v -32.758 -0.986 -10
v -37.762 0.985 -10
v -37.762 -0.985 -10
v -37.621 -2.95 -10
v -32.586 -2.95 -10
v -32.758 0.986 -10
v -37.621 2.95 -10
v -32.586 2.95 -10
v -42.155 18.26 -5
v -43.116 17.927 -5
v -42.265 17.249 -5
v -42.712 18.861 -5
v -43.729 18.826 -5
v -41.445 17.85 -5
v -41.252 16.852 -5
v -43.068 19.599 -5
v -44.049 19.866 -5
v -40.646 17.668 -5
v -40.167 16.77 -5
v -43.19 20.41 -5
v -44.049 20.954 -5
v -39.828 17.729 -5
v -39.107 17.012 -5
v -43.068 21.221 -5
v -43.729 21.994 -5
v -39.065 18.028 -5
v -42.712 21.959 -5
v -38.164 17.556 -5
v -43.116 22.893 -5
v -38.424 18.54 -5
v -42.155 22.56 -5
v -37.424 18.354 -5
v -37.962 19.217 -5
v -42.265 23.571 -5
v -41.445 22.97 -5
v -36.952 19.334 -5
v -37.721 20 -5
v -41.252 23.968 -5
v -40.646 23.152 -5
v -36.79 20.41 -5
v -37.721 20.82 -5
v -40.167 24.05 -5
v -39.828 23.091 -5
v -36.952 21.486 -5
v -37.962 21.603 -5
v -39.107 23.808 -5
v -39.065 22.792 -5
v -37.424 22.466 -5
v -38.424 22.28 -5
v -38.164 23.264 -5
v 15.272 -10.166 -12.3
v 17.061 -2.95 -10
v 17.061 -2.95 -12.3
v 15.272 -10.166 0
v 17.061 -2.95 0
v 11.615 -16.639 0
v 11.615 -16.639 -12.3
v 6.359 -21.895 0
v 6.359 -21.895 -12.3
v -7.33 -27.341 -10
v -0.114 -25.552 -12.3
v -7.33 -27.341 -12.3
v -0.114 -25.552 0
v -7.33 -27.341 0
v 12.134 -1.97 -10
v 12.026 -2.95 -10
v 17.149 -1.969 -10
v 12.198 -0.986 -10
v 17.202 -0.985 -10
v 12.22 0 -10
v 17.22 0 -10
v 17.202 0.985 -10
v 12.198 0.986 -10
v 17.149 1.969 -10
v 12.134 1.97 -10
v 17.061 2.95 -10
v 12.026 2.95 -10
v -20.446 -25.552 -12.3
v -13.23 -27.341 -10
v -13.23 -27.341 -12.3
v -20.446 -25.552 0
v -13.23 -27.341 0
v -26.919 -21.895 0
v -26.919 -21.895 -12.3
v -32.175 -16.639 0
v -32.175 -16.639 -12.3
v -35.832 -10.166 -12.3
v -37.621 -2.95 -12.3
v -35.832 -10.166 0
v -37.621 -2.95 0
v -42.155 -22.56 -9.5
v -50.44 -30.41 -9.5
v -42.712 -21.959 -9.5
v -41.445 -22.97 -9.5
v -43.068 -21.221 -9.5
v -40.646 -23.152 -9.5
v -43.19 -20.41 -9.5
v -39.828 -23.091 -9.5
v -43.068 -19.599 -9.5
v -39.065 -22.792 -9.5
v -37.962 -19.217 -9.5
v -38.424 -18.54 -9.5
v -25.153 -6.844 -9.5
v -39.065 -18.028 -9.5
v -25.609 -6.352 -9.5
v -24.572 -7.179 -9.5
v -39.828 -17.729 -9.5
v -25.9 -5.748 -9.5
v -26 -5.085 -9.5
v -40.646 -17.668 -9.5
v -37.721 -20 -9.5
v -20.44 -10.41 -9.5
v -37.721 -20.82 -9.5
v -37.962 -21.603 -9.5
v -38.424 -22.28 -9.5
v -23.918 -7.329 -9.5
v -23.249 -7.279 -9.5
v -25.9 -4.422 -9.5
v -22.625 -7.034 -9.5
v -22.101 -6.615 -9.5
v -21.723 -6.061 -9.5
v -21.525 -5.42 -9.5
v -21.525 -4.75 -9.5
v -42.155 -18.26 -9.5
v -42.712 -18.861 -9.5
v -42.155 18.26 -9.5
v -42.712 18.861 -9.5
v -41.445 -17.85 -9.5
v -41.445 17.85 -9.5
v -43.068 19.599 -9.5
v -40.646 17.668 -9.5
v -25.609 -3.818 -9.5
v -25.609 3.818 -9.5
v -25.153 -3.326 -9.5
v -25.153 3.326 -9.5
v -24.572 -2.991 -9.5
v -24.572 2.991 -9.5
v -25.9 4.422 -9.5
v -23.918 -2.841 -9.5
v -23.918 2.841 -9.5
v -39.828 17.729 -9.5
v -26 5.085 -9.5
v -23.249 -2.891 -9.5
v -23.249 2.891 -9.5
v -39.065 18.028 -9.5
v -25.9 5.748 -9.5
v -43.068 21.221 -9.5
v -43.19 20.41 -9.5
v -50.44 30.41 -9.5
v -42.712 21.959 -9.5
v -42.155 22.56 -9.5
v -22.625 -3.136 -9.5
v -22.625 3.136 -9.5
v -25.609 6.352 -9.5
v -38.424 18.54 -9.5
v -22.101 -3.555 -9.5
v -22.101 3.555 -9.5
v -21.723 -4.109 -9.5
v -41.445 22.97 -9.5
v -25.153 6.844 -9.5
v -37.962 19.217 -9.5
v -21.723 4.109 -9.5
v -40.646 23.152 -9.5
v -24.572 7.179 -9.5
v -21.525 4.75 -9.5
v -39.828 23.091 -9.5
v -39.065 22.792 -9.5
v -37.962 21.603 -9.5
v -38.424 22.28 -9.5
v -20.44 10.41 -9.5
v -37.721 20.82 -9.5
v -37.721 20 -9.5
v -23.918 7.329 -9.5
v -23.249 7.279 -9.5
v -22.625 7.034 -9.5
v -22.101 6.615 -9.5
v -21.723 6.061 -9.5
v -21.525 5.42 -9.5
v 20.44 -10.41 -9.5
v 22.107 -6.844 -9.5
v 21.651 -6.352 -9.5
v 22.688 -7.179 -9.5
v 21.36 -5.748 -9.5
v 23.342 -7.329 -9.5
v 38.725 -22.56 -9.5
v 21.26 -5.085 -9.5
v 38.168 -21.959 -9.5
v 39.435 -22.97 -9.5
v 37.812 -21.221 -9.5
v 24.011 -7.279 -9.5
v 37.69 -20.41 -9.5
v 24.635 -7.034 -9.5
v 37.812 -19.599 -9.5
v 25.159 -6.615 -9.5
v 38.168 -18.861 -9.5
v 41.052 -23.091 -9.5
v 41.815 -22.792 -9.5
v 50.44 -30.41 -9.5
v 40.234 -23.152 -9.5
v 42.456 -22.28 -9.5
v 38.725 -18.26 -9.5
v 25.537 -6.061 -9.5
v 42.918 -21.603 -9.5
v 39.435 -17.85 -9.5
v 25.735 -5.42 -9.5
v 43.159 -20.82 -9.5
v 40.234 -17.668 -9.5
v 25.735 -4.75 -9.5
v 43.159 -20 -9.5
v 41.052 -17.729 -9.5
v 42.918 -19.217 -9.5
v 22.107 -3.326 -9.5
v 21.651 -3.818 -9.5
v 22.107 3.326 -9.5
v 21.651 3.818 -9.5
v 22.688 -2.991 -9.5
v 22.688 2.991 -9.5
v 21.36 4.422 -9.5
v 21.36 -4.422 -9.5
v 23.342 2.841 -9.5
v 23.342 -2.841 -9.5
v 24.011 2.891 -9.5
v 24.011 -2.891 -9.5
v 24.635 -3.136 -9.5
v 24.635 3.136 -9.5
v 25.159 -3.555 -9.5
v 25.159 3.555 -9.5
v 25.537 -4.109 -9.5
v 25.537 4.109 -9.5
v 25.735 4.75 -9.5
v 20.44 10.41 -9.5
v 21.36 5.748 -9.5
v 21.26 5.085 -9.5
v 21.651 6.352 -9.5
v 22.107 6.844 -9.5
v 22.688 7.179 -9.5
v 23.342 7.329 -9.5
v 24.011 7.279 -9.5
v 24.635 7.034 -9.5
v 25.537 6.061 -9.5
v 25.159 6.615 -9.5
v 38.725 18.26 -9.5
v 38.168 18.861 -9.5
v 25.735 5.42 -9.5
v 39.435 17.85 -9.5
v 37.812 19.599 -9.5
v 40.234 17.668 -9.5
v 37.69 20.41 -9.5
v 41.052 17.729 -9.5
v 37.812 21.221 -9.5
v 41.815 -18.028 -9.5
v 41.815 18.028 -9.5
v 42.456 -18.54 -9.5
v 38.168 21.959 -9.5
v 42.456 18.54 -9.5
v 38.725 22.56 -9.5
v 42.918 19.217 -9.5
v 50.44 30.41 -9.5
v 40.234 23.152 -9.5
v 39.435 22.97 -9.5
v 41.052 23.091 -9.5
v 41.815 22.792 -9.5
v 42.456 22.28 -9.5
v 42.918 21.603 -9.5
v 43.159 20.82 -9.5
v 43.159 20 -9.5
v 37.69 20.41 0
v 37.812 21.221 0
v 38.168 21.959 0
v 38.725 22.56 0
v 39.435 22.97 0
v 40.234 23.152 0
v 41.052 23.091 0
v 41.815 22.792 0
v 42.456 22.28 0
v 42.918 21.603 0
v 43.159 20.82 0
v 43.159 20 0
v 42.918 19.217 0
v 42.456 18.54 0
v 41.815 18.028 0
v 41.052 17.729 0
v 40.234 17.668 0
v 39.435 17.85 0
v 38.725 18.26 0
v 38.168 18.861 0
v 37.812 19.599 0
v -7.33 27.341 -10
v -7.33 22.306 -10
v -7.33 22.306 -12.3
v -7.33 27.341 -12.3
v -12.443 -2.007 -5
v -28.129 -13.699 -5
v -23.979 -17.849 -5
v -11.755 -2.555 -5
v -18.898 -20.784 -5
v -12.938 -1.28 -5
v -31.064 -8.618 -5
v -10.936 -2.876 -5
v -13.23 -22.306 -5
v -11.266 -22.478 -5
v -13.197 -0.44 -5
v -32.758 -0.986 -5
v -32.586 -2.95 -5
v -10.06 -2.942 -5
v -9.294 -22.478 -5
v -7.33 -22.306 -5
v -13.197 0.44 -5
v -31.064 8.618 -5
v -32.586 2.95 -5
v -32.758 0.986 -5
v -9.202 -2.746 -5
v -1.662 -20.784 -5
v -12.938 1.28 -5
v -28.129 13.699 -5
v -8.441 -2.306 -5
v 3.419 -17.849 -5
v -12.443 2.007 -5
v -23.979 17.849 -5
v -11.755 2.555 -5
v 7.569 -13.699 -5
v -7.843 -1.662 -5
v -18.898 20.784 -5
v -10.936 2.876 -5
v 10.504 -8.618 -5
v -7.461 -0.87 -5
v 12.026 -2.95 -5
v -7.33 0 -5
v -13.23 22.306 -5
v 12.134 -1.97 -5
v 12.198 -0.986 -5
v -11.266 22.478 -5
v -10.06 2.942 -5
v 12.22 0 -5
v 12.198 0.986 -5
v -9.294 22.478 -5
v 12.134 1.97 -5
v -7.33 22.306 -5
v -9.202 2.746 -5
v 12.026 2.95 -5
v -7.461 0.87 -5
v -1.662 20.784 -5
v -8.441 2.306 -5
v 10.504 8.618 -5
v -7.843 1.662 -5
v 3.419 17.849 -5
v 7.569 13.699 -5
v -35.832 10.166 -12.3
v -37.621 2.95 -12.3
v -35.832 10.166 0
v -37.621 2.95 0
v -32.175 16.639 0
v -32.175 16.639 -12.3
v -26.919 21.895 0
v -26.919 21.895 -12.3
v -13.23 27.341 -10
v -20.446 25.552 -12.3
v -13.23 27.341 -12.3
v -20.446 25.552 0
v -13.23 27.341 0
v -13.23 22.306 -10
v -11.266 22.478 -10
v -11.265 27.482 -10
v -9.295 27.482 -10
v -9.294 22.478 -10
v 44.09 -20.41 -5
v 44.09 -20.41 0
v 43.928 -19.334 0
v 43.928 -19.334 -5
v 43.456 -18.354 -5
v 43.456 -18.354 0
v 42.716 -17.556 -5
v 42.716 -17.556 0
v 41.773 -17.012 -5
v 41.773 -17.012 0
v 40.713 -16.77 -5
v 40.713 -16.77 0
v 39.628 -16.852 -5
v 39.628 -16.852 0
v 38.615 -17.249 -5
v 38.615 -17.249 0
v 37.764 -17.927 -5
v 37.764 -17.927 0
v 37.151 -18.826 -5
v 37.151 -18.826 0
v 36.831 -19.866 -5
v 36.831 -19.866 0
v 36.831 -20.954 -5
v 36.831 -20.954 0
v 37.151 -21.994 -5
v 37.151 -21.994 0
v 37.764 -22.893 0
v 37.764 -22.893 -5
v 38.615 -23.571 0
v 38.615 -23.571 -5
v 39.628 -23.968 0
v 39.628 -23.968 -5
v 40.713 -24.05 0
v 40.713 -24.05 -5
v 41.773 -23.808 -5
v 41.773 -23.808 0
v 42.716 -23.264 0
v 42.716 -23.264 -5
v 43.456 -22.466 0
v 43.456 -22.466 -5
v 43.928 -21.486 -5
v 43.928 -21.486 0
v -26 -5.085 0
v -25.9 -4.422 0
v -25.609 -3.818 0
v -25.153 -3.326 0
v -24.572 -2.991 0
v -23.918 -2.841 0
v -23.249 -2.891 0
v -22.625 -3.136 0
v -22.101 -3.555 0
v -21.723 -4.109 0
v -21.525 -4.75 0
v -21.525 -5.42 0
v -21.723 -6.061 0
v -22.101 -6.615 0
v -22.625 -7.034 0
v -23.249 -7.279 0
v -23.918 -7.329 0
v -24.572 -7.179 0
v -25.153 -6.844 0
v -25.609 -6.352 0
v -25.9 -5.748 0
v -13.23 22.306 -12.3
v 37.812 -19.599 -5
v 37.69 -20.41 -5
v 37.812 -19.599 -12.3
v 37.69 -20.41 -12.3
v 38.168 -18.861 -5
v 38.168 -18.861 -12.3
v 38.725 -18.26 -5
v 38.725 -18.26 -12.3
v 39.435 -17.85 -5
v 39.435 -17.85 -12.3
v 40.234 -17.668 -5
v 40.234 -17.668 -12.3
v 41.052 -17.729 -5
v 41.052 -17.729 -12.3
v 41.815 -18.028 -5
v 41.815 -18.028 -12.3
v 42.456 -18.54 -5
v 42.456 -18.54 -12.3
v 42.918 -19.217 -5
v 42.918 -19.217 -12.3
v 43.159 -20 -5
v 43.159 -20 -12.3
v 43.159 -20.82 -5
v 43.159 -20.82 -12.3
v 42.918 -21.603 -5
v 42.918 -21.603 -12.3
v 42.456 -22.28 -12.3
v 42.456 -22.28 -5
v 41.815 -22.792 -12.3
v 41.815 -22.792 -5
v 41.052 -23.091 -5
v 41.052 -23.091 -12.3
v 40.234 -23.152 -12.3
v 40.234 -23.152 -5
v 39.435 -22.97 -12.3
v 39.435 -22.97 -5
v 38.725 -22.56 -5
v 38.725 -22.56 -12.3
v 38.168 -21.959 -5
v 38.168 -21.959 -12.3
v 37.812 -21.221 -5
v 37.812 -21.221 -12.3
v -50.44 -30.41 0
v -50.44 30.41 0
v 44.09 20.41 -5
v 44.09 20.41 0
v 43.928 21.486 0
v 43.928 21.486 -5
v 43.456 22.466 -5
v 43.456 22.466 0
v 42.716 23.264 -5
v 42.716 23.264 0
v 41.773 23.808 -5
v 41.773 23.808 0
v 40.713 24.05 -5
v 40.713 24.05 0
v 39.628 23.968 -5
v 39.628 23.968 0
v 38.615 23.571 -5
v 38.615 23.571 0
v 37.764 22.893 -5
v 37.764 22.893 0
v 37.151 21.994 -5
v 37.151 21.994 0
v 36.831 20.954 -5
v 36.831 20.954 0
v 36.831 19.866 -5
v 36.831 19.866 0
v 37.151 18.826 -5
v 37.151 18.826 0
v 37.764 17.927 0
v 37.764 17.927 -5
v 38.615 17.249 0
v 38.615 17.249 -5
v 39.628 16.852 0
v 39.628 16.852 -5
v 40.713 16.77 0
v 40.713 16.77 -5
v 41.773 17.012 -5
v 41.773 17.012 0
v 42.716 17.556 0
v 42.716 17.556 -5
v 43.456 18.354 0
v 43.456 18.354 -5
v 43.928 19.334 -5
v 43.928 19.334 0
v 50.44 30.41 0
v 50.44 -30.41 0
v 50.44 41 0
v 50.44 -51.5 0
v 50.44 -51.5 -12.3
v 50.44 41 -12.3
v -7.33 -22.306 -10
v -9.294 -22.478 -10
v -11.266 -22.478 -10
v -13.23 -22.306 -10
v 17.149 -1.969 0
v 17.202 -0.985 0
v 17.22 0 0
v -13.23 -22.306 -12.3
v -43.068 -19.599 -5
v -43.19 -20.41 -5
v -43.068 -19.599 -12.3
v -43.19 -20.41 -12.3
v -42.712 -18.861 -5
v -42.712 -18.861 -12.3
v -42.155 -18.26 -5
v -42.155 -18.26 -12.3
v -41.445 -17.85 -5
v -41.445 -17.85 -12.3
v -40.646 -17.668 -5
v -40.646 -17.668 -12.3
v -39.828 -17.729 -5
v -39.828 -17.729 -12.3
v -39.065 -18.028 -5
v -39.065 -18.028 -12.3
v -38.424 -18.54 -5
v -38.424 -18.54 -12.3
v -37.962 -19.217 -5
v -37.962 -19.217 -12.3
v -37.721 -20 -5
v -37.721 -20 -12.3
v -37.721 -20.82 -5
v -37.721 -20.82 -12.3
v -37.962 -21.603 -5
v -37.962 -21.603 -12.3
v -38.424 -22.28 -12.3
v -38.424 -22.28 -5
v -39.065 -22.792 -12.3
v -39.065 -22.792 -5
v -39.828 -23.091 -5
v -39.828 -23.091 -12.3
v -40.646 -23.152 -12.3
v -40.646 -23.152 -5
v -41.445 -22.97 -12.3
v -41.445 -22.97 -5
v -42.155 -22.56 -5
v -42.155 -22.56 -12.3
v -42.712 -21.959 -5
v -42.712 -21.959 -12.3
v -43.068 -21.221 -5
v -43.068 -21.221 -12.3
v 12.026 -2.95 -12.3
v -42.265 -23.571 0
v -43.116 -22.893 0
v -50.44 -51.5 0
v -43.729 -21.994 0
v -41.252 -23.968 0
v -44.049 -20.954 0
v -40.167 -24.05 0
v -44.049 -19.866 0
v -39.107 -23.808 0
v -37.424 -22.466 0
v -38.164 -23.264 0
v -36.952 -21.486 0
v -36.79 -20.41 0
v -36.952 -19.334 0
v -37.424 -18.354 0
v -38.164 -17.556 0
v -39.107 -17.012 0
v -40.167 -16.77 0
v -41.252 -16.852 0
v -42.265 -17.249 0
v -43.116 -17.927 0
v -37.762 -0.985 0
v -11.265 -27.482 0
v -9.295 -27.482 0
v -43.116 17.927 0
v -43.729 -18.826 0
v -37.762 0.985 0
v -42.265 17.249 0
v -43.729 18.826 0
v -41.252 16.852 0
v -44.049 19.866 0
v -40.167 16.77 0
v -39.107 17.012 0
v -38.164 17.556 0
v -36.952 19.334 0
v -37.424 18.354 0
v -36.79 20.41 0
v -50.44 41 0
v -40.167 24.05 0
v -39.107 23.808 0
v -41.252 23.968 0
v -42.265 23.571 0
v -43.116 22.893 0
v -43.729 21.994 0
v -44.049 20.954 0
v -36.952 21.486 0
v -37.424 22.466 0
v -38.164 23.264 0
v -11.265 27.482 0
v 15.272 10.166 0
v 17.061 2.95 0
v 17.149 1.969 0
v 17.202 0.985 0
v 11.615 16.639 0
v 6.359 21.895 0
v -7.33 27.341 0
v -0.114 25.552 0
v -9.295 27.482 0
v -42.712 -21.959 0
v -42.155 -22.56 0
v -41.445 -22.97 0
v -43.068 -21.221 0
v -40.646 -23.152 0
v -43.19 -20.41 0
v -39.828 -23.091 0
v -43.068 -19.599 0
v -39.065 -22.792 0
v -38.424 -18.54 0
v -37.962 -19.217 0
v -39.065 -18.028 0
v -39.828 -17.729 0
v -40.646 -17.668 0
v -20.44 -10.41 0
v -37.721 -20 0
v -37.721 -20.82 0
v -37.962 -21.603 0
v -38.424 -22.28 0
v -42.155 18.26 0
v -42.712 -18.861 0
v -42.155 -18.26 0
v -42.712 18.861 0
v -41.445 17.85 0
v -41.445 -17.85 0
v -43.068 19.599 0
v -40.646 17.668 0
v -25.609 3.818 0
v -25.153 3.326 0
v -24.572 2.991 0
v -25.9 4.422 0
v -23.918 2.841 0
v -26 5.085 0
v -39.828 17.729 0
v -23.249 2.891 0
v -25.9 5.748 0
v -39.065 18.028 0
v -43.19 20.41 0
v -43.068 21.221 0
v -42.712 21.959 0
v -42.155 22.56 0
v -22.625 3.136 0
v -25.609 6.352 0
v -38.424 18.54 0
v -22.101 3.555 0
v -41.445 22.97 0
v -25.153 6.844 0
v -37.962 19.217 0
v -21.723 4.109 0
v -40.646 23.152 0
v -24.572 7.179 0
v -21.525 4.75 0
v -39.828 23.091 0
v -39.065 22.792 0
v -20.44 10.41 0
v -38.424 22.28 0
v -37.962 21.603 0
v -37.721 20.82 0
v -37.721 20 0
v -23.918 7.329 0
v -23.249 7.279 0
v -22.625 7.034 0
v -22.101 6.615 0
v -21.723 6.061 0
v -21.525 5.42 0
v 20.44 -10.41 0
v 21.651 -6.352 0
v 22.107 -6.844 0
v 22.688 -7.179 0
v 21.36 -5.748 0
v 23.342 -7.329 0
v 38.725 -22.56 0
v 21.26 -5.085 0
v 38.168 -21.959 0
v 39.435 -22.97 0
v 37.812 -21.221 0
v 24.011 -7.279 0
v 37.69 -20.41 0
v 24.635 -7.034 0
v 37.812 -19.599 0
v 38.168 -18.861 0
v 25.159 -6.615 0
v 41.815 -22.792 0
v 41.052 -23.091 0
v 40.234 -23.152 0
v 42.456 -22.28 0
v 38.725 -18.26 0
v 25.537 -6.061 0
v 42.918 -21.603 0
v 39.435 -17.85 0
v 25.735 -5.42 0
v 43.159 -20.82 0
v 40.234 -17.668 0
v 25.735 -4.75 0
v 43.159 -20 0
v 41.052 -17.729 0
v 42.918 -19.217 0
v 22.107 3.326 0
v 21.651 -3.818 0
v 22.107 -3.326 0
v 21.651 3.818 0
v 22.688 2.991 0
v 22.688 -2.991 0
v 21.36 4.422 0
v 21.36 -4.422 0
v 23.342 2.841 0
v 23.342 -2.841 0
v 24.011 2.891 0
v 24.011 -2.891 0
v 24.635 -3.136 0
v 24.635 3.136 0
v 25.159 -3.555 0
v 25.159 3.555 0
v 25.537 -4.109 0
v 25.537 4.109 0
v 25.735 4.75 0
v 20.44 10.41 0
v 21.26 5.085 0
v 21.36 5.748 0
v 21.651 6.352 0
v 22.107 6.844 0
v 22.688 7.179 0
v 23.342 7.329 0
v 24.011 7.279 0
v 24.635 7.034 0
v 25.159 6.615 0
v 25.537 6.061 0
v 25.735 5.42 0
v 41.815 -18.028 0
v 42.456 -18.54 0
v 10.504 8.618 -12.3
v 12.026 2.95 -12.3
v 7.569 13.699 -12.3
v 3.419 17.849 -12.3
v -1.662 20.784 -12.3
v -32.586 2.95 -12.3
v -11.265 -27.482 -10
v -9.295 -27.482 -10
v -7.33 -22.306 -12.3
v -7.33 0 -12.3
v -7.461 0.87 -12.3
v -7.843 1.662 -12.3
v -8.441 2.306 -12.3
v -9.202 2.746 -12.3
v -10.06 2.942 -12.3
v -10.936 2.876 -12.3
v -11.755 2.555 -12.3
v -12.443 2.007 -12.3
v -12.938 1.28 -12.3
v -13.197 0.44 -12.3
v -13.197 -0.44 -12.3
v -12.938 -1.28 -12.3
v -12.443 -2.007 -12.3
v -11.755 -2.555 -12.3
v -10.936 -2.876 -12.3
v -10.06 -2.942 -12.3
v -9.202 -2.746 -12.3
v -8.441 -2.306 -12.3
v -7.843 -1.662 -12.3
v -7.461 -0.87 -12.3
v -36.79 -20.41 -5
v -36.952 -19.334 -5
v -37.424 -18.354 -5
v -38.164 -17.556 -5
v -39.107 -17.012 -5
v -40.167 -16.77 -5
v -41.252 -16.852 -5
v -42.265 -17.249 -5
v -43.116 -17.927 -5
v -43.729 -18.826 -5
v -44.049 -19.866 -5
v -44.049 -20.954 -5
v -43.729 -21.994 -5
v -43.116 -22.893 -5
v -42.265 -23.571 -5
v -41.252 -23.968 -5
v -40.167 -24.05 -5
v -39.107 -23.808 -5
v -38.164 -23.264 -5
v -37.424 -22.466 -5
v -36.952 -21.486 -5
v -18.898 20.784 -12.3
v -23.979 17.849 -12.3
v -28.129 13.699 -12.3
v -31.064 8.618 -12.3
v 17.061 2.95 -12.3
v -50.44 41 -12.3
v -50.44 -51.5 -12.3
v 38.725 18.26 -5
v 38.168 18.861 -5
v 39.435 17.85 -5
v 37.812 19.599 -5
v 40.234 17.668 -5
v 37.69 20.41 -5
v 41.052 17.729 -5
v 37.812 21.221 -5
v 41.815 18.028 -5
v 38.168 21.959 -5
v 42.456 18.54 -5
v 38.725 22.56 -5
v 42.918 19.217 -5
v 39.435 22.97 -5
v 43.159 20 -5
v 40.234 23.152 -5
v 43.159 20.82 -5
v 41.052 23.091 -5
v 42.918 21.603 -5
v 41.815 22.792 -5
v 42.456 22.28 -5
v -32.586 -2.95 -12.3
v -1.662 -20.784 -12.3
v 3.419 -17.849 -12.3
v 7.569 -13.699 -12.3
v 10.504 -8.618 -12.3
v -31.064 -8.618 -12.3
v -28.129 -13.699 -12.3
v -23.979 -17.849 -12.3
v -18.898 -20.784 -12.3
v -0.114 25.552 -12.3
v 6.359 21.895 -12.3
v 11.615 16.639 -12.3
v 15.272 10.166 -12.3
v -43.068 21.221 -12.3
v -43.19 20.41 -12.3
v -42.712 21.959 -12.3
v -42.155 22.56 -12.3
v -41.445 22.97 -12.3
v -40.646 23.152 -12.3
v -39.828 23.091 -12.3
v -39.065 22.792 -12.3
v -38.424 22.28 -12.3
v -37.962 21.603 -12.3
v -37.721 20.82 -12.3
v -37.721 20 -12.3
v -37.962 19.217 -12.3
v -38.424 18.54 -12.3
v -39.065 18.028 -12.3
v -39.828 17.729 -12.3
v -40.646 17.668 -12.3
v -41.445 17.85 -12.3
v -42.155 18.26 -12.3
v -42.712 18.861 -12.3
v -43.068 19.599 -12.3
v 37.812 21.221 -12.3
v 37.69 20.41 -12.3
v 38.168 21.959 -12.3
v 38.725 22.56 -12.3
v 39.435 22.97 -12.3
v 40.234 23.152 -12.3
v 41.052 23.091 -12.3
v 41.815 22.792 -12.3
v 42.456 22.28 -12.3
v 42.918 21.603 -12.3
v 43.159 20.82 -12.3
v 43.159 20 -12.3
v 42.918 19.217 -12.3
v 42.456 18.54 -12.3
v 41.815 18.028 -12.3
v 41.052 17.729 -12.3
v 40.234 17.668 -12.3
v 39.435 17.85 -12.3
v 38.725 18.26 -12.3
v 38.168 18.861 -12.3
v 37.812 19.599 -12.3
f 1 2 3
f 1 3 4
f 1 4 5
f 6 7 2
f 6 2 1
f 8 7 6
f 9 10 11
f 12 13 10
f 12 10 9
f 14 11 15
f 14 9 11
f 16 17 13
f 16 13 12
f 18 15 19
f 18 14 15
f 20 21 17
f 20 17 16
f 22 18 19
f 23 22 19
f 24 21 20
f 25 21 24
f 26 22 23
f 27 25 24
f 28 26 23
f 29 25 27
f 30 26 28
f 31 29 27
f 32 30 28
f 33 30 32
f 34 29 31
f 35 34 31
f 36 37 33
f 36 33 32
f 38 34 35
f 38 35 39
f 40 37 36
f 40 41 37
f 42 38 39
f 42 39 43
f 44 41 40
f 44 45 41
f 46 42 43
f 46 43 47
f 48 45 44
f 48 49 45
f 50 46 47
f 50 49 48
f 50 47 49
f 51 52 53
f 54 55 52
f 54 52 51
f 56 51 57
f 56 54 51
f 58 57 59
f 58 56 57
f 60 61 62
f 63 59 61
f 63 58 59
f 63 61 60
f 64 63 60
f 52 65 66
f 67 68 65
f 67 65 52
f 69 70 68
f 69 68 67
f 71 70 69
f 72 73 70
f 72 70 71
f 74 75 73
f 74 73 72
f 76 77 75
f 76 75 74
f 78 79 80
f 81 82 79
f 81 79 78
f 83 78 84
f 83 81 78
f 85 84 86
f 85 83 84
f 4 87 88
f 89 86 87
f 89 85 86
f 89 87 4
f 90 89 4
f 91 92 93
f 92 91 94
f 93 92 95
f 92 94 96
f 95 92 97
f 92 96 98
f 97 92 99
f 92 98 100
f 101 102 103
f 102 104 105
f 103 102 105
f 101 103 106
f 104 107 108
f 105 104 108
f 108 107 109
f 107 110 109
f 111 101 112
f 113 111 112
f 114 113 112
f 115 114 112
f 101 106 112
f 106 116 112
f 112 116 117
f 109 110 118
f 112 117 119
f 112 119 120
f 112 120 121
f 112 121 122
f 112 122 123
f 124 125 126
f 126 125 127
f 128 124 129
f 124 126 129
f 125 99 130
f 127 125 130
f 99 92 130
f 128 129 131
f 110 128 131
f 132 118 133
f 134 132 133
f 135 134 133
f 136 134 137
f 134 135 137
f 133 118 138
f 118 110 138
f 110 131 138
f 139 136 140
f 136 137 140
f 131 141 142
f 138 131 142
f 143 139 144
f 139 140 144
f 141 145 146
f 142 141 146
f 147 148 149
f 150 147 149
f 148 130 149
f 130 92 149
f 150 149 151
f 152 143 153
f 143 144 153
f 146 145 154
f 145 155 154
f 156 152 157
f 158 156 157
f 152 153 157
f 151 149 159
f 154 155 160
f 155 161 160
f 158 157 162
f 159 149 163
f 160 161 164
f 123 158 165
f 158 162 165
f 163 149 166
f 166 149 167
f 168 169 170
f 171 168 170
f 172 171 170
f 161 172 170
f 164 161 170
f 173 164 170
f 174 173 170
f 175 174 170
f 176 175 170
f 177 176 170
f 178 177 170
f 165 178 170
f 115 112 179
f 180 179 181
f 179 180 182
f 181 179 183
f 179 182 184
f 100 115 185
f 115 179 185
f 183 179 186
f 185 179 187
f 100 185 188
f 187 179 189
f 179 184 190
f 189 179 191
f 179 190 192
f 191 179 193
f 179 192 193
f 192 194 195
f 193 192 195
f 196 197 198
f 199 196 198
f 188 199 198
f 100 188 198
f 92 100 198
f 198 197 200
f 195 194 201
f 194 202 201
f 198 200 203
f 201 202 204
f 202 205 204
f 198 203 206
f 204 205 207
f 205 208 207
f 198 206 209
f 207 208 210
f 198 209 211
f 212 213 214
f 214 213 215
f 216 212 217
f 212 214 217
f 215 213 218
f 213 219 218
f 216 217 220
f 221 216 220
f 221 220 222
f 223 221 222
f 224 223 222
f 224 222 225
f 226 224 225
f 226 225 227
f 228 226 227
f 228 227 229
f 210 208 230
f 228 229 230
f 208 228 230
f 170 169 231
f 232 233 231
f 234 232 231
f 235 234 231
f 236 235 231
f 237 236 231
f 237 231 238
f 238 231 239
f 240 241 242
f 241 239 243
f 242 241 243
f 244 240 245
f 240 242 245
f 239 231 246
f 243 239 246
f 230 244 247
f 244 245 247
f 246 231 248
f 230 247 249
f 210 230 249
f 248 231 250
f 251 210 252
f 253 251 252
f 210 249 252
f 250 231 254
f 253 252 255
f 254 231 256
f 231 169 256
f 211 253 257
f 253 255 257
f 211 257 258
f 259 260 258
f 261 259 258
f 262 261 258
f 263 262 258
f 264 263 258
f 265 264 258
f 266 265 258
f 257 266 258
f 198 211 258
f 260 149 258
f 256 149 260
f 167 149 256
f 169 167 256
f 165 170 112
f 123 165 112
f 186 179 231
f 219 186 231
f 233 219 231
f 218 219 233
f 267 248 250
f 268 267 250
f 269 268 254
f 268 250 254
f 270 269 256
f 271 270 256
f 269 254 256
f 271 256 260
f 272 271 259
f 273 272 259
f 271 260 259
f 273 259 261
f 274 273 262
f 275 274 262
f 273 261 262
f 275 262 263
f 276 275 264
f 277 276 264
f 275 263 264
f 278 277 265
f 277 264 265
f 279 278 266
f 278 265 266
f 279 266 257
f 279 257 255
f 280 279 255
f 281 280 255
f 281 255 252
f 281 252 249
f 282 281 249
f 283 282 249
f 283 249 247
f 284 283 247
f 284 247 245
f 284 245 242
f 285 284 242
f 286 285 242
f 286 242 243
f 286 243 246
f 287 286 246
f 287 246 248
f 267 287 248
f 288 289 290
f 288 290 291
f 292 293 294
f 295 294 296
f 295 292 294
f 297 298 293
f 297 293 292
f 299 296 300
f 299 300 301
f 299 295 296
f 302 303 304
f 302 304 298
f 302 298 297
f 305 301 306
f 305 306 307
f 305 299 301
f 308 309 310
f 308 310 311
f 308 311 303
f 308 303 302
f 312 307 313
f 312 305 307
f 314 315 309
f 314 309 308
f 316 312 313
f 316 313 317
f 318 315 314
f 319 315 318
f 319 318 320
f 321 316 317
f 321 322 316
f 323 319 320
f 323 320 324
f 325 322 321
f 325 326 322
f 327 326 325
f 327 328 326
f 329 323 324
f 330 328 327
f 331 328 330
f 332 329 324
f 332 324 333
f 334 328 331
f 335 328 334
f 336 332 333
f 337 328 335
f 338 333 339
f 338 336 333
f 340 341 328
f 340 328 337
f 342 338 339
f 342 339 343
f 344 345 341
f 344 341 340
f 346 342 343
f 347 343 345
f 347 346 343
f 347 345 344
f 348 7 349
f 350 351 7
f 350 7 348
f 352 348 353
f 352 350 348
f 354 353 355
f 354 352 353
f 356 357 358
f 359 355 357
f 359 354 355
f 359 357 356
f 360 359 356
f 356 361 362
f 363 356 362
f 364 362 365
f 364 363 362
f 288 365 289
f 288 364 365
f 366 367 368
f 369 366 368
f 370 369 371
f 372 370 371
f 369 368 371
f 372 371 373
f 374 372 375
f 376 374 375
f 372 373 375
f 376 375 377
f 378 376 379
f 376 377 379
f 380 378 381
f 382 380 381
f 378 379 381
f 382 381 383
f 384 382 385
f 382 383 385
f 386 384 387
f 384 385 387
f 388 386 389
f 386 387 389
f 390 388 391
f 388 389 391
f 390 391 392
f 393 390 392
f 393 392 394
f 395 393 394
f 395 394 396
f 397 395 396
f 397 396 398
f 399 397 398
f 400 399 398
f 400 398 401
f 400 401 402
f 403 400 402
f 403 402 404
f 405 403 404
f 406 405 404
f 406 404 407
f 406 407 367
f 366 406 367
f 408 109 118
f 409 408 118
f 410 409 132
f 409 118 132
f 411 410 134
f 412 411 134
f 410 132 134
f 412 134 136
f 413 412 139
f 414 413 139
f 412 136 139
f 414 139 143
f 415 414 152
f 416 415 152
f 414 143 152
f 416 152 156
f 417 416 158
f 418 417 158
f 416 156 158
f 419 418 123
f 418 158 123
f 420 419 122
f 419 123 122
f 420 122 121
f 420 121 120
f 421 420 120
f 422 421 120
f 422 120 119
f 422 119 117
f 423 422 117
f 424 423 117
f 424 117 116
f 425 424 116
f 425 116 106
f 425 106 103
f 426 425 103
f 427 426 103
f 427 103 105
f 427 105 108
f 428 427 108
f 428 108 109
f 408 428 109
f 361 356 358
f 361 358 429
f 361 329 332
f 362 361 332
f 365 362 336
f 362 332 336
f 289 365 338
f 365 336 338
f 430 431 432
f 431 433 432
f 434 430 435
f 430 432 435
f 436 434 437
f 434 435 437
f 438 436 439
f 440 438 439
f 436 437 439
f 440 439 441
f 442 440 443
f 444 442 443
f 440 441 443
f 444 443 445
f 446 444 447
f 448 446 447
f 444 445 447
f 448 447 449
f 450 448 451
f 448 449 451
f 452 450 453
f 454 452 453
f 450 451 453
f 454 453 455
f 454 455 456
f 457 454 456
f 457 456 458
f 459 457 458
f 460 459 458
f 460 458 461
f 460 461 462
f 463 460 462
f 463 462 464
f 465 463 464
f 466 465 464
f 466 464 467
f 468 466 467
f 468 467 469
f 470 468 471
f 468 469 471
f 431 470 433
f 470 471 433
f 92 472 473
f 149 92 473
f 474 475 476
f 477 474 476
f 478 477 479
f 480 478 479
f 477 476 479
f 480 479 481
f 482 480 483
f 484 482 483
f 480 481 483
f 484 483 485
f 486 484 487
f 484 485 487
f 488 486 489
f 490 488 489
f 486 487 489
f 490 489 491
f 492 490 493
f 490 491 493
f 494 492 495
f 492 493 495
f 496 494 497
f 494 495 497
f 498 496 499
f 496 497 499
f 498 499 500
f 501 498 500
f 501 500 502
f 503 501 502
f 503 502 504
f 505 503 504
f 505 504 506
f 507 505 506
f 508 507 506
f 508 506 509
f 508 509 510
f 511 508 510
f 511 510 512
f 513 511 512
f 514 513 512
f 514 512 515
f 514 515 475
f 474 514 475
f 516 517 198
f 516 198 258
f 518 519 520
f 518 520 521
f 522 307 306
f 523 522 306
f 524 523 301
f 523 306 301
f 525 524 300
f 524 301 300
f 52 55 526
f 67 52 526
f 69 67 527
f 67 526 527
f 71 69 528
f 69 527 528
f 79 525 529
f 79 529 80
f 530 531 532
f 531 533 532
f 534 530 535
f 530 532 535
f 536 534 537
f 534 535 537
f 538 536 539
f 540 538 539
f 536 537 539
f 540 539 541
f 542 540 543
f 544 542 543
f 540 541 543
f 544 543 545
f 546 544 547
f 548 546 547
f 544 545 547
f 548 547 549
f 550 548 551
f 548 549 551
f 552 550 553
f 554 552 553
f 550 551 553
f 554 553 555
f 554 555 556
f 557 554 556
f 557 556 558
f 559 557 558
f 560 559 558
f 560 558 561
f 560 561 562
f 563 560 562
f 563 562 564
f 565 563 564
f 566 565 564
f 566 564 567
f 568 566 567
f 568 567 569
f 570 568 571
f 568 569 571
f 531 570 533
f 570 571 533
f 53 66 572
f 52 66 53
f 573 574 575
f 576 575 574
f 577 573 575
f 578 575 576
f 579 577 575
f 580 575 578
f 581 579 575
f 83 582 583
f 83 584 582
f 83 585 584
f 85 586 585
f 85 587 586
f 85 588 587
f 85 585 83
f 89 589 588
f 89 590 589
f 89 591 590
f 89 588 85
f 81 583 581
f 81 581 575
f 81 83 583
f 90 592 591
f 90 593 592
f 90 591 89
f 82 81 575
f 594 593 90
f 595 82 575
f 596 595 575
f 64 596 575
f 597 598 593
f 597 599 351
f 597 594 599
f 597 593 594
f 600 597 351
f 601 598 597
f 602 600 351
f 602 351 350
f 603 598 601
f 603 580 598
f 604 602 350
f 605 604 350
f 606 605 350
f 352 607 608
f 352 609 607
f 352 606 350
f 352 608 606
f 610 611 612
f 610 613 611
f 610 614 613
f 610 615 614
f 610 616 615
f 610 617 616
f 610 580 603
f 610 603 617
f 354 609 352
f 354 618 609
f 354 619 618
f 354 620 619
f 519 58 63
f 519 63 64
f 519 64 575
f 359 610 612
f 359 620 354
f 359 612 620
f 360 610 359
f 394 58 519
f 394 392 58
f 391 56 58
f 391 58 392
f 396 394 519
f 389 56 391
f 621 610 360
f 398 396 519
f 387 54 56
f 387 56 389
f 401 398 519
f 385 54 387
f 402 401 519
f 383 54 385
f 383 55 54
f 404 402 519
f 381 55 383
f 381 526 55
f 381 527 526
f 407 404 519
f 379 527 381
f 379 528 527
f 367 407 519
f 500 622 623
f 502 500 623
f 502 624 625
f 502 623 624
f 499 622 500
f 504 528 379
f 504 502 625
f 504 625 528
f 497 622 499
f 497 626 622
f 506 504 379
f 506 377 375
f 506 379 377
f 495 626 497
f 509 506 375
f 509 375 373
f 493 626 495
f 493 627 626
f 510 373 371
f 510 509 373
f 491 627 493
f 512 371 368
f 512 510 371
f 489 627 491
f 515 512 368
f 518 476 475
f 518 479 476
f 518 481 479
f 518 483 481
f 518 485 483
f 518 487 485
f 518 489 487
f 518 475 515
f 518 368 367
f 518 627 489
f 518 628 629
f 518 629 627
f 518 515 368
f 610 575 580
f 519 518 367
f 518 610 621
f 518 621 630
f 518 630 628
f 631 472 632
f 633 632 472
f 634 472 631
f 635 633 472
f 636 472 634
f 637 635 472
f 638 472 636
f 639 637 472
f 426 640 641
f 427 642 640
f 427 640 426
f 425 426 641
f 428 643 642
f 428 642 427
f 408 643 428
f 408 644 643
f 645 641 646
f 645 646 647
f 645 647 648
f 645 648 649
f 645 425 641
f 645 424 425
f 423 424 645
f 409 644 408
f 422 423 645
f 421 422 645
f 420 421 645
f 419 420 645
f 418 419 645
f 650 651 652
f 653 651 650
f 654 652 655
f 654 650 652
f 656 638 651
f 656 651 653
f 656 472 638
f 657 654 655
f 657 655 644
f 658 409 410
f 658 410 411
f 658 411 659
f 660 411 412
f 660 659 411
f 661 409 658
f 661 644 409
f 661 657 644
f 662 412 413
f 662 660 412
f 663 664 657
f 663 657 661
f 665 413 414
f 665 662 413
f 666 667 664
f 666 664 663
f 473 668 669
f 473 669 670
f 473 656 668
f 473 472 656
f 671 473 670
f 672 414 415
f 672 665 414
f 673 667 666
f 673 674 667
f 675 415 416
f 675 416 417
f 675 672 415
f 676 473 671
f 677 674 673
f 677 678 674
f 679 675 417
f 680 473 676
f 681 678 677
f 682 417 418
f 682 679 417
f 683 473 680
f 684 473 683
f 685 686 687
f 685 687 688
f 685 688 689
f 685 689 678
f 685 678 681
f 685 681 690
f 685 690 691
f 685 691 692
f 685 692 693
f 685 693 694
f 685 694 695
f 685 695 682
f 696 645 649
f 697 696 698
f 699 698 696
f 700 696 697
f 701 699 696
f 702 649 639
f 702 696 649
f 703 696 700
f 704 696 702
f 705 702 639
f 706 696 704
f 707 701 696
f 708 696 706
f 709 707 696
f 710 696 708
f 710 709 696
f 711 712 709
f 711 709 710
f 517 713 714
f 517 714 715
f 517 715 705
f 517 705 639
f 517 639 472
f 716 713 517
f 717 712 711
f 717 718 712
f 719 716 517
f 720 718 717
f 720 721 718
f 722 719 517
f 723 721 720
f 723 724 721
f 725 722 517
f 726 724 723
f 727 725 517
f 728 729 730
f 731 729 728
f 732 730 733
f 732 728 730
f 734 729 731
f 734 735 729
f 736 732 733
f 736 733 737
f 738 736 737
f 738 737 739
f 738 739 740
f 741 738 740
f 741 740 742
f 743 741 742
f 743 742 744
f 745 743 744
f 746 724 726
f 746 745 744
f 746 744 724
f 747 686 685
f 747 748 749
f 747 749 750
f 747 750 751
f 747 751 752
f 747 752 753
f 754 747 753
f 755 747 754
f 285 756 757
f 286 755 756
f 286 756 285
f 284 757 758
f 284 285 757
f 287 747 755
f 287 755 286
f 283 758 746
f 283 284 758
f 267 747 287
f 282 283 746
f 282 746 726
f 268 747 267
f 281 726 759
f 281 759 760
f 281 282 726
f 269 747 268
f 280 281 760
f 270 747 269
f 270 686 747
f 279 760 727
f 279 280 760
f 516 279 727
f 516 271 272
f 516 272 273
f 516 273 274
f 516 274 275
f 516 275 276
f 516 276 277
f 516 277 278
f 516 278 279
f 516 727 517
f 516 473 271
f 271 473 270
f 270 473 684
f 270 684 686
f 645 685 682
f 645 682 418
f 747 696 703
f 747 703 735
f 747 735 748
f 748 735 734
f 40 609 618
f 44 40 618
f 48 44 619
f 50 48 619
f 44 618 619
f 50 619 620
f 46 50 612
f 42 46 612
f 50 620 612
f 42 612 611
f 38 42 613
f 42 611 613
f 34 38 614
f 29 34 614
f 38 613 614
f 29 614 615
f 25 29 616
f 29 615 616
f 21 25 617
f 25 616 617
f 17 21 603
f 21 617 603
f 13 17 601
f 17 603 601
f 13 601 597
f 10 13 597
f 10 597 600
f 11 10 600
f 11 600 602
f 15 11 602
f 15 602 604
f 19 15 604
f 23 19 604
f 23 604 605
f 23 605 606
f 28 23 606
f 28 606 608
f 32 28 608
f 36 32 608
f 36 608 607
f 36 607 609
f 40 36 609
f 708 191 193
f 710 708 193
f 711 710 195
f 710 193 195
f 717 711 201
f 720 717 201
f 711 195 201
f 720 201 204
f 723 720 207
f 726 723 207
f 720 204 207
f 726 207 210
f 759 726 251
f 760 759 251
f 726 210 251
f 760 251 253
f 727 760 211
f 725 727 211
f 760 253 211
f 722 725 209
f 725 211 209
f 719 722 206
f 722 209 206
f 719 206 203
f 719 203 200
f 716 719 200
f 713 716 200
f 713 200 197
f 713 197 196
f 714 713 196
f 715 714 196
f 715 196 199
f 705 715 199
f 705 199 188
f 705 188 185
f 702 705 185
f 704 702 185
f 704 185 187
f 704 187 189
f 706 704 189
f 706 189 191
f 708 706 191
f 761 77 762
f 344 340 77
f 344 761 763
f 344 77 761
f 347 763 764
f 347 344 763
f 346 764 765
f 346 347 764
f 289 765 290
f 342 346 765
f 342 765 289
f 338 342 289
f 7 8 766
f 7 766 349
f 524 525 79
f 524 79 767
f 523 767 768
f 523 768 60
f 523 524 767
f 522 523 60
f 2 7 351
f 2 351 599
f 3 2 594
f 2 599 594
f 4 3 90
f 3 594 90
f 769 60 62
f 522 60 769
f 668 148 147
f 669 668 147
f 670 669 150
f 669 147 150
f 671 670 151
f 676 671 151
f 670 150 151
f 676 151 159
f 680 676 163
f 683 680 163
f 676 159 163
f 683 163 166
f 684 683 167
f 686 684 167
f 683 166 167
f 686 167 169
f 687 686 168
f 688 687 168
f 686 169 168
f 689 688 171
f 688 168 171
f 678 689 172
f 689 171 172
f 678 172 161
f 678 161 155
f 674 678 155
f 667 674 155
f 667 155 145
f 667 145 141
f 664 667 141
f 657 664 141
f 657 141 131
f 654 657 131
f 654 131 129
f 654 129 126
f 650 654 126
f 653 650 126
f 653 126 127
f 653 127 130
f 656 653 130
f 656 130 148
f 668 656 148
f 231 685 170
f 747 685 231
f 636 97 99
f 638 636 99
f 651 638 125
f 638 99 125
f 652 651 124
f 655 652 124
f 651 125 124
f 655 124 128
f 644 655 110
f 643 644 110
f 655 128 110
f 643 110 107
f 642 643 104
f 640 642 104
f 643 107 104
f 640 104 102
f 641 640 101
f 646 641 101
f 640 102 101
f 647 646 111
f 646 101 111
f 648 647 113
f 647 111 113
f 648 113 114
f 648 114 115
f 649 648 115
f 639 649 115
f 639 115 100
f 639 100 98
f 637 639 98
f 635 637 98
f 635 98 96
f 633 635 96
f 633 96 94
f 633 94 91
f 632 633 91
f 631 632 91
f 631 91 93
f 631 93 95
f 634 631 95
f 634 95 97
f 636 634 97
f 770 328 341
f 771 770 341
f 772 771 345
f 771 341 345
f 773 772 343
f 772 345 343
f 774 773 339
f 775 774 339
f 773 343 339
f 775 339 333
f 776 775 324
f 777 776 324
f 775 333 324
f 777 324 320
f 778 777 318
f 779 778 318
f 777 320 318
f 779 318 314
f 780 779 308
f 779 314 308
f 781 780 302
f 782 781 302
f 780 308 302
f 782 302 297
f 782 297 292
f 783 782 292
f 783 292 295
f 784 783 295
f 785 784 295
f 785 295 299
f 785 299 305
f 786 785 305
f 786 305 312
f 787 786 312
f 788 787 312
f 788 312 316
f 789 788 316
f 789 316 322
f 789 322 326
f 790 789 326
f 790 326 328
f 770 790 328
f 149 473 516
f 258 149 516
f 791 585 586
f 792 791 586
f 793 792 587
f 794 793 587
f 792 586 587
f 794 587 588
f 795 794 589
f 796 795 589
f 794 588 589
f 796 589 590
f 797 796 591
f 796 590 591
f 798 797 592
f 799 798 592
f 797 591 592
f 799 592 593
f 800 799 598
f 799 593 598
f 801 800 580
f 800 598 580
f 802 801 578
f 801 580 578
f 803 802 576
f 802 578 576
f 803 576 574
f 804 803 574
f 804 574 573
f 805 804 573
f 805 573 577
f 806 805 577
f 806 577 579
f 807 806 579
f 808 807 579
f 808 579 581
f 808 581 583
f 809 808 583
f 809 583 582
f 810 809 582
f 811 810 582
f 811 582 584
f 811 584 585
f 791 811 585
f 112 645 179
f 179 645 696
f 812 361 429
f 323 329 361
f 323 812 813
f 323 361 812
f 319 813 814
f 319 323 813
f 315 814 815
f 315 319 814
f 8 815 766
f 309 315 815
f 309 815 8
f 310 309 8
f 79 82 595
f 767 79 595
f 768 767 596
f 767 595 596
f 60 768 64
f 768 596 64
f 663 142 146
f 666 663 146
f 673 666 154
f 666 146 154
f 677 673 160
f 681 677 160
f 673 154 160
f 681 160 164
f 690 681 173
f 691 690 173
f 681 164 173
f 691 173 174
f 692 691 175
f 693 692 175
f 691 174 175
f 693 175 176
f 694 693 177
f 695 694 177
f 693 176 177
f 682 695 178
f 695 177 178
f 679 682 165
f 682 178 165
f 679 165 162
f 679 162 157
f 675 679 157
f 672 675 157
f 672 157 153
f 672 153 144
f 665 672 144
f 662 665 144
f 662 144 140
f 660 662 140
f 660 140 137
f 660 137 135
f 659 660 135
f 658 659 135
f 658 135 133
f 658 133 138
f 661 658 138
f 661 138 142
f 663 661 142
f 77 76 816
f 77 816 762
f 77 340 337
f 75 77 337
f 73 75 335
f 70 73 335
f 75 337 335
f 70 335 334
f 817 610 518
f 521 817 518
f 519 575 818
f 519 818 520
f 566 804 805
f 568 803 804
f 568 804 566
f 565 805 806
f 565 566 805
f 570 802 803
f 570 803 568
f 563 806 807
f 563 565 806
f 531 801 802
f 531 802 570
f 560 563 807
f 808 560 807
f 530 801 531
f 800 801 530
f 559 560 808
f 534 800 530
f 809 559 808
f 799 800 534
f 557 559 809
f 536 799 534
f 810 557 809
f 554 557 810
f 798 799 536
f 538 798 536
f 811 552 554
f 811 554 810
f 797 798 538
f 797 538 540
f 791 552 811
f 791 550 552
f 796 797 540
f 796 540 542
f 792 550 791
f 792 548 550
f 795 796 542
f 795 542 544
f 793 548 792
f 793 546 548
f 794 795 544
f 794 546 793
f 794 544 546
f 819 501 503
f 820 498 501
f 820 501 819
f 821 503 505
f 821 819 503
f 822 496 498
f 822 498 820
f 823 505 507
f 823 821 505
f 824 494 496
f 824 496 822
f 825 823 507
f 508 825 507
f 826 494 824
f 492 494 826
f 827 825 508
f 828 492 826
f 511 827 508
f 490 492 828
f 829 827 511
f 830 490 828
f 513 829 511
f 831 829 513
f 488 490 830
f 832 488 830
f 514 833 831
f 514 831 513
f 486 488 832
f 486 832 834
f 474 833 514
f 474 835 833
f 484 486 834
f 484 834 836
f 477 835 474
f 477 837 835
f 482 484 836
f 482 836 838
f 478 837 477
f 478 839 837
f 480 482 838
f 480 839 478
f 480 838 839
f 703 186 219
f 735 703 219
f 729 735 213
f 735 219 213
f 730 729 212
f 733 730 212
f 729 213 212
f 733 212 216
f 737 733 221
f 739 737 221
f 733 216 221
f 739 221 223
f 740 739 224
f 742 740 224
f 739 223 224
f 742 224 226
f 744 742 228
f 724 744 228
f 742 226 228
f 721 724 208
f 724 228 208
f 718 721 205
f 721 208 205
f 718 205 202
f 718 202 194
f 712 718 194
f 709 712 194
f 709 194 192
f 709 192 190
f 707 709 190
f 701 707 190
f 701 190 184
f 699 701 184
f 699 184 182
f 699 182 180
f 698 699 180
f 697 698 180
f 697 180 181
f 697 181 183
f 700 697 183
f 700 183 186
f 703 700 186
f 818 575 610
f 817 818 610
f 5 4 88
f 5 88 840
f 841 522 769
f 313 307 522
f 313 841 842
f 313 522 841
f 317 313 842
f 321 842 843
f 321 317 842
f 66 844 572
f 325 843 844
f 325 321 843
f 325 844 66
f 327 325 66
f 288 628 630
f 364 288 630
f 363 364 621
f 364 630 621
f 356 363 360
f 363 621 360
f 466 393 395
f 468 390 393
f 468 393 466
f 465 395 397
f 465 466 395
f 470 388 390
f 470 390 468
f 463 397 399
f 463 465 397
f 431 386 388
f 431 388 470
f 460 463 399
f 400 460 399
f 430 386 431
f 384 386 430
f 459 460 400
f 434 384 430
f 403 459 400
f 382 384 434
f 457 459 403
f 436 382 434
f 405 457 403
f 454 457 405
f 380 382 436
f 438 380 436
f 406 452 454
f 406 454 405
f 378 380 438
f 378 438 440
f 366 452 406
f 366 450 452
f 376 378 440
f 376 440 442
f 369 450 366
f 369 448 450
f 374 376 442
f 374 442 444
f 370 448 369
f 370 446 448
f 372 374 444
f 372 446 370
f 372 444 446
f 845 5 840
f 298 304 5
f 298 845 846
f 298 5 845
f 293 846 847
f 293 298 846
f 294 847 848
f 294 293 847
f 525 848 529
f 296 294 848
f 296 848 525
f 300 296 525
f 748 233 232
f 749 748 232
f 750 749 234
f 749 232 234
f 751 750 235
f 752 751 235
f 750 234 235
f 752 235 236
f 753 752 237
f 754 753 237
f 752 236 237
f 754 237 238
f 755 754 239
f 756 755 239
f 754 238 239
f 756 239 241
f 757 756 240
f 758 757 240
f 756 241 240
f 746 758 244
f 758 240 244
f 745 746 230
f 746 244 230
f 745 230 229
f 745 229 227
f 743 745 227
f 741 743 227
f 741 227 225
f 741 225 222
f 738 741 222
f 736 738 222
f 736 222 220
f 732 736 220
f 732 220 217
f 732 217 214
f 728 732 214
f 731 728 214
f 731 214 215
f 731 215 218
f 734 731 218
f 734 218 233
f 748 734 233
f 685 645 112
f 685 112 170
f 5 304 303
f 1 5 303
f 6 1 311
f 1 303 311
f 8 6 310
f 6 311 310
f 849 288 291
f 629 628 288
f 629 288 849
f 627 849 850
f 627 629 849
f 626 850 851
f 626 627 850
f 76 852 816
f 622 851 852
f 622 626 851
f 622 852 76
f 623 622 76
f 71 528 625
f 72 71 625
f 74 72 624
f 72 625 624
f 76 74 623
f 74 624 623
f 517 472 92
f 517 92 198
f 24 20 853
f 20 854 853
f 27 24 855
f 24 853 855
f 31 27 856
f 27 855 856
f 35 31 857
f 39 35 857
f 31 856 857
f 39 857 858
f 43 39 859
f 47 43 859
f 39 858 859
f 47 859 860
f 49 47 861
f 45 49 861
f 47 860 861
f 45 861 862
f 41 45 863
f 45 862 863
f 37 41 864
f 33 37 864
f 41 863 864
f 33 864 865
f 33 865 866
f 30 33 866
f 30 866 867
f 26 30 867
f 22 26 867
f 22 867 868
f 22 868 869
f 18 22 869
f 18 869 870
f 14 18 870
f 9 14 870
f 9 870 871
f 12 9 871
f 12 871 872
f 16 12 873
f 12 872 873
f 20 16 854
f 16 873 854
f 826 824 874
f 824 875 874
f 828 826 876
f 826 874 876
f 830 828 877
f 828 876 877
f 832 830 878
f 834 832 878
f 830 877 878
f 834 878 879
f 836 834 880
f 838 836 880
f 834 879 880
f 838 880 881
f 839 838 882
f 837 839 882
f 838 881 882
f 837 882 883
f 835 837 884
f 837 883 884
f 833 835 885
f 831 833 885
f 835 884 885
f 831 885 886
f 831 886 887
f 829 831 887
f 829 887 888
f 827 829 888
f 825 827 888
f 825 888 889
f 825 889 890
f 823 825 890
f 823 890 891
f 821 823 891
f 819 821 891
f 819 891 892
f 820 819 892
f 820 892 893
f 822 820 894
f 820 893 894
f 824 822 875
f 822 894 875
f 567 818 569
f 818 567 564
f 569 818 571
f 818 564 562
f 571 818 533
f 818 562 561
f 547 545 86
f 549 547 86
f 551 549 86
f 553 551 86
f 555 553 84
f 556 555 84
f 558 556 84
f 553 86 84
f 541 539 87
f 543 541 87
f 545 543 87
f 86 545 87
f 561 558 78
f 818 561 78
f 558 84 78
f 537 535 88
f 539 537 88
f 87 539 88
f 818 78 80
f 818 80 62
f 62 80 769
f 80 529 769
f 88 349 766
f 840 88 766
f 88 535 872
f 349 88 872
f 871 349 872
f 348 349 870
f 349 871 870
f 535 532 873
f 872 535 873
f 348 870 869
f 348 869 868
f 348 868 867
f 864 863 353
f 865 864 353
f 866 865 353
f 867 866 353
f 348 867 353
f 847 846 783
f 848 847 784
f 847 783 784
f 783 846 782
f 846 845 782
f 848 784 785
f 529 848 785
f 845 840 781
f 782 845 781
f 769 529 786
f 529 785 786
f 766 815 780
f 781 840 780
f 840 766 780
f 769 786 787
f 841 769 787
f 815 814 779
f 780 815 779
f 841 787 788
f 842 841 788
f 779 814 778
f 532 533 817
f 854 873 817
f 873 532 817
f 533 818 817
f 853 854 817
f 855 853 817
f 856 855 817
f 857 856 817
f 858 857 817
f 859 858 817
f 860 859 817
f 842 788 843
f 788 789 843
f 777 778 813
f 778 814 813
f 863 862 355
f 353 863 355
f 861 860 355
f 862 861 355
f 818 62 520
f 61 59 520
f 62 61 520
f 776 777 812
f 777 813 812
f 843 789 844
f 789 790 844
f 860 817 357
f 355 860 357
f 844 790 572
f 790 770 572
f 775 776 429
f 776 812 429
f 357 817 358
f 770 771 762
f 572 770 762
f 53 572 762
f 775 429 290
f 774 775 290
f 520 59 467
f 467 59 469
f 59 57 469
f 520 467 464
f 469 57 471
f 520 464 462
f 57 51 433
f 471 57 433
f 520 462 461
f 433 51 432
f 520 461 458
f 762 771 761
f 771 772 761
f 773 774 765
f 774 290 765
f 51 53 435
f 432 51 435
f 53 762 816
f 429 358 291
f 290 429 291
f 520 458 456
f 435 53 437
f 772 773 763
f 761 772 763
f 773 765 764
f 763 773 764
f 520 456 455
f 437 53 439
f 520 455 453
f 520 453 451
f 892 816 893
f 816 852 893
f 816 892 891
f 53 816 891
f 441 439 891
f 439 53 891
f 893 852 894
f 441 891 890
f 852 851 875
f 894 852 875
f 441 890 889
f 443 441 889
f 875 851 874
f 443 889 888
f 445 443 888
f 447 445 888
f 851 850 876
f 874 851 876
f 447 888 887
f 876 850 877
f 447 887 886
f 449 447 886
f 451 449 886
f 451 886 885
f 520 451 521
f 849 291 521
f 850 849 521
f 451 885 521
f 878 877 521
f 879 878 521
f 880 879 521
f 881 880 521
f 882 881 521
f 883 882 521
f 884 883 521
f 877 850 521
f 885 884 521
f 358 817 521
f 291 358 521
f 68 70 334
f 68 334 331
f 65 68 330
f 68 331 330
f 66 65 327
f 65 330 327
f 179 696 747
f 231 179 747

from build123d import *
from build123d import SkipClean  # not in build123d's __all__

# Parameters (mm, degrees)
F1_W           = 100.88
F1_H           = 60.82
F1_W_2         = 40.88
F1_H_2         = 20.82
F2_DEPTH       = 9.5
F3_D           = 4.5
F4_D           = 5.5
F5_W           = 100.88
F5_H           = 92.5
F5_R           = 2.95
F6_DEPTH       = 12.3
F7_DEPTH       = 10
F8_DEPTH       = 5
F9_D           = 5.5
F9_CBORE_D     = 7.3
F9_CBORE_DEPTH = 5


with BuildPart() as f2:
    # F1 (on Top) → F2 (new body)
    with BuildSketch(Plane.XY):
        Rectangle(F1_W, F1_H)
        Rectangle(F1_W_2, F1_H_2, mode=Mode.SUBTRACT)
    extrude(amount=-F2_DEPTH)

    # F3 (through all)
    with Locations(Plane.XY):
        with Locations((-23.75, 5.085), (-23.75, -5.085), (23.51, -5.085), (23.51, 5.085), (23.51, -5.085)):
            Hole(F3_D / 2)

    # F4 (through all)
    with Locations(Plane.XY):
        with Locations((-40.44, 20.41), (-40.44, -20.41), (40.44, -20.41), (40.44, 20.41)):
            Hole(F4_D / 2)


with BuildPart() as f6:
    # F5 (on Top) → F6 (new body)
    with BuildSketch(Plane.XY):
        with Locations((0, -5.25)):
            Rectangle(F5_W, F5_H)
        with BuildLine():
            ThreePointArc((-7.33, 27.3413148916), (9.1654364826, 19.4454364826), (17.0613148916, 2.95))
            ThreePointArc((17.0613148916, 2.95), (17.1803000668, 1.4771324385), (17.22, 0))
            ThreePointArc((17.22, 0), (17.1803000668, -1.4771324385), (17.0613148916, -2.95))
            ThreePointArc((17.0613148916, -2.95), (9.1654364826, -19.4454364826), (-7.33, -27.3413148916))
            ThreePointArc((-7.33, -27.3413148916), (-10.28, -27.5), (-13.23, -27.3413148916))
            ThreePointArc((-13.23, -27.3413148916), (-29.7254364826, -19.4454364826), (-37.6213148916, -2.95))
            ThreePointArc((-37.6213148916, -2.95), (-37.78, 0), (-37.6213148916, 2.95))
            ThreePointArc((-37.6213148916, 2.95), (-29.7254364826, 19.4454364826), (-13.23, 27.3413148916))
            ThreePointArc((-13.23, 27.3413148916), (-10.28, 27.5), (-7.33, 27.3413148916))
        make_face(mode=Mode.SUBTRACT)
        with BuildLine():
            ThreePointArc((-32.5857727954, -2.95), (-32.78, 0), (-32.5857727954, 2.95))
            Line((-32.5857727954, 2.95), (-37.6213148916, 2.95))
            ThreePointArc((-37.6213148916, 2.95), (-37.78, 0), (-37.6213148916, -2.95))
            Line((-37.6213148916, -2.95), (-32.5857727954, -2.95))
        make_face()
        with BuildLine():
            ThreePointArc((12.0257727954, -2.95), (12.1713906907, -1.4781935096), (12.22, 0))
            ThreePointArc((12.22, 0), (12.1713906907, 1.4781935096), (12.0257727954, 2.95))
            ThreePointArc((12.0257727954, 2.95), (5.6299025767, 15.9099025767), (-7.33, 22.3057727954))
            ThreePointArc((-7.33, 22.3057727954), (-10.28, 22.5), (-13.23, 22.3057727954))
            ThreePointArc((-13.23, 22.3057727954), (-26.1899025767, 15.9099025767), (-32.5857727954, 2.95))
            ThreePointArc((-32.5857727954, 2.95), (-32.78, 0), (-32.5857727954, -2.95))
            ThreePointArc((-32.5857727954, -2.95), (-26.1899025767, -15.9099025767), (-13.23, -22.3057727954))
            ThreePointArc((-13.23, -22.3057727954), (-10.28, -22.5), (-7.33, -22.3057727954))
            ThreePointArc((-7.33, -22.3057727954), (5.6299025767, -15.9099025767), (12.0257727954, -2.95))
        make_face()
        with Locations((-10.28, 0)):
            Circle(F5_R, mode=Mode.SUBTRACT)
        with BuildLine():
            ThreePointArc((-13.23, 22.3057727954), (-10.28, 22.5), (-7.33, 22.3057727954))
            Line((-7.33, 22.3057727954), (-7.33, 27.3413148916))
            ThreePointArc((-7.33, 27.3413148916), (-10.28, 27.5), (-13.23, 27.3413148916))
            Line((-13.23, 27.3413148916), (-13.23, 22.3057727954))
        make_face()
        with BuildLine():
            ThreePointArc((12.0257727954, 2.95), (12.1713906907, 1.4781935096), (12.22, 0))
            ThreePointArc((12.22, 0), (12.1713906907, -1.4781935096), (12.0257727954, -2.95))
            Line((12.0257727954, -2.95), (17.0613148916, -2.95))
            ThreePointArc((17.0613148916, -2.95), (17.1803000668, -1.4771324385), (17.22, 0))
            ThreePointArc((17.22, 0), (17.1803000668, 1.4771324385), (17.0613148916, 2.95))
            Line((17.0613148916, 2.95), (12.0257727954, 2.95))
        make_face()
        with BuildLine():
            Line((-7.33, -27.3413148916), (-7.33, -22.3057727954))
            ThreePointArc((-7.33, -22.3057727954), (-10.28, -22.5), (-13.23, -22.3057727954))
            Line((-13.23, -22.3057727954), (-13.23, -27.3413148916))
            ThreePointArc((-13.23, -27.3413148916), (-10.28, -27.5), (-7.33, -27.3413148916))
        make_face()
    extrude(amount=-F6_DEPTH)

    # F5 (on Top) → F7 (cut)
    with BuildSketch(Plane.XY):
        with BuildLine():
            ThreePointArc((-13.23, 22.3057727954), (-10.28, 22.5), (-7.33, 22.3057727954))
            Line((-7.33, 22.3057727954), (-7.33, 27.3413148916))
            ThreePointArc((-7.33, 27.3413148916), (-10.28, 27.5), (-13.23, 27.3413148916))
            Line((-13.23, 27.3413148916), (-13.23, 22.3057727954))
        make_face()
        with BuildLine():
            ThreePointArc((-32.5857727954, -2.95), (-32.78, 0), (-32.5857727954, 2.95))
            Line((-32.5857727954, 2.95), (-37.6213148916, 2.95))
            ThreePointArc((-37.6213148916, 2.95), (-37.78, 0), (-37.6213148916, -2.95))
            Line((-37.6213148916, -2.95), (-32.5857727954, -2.95))
        make_face()
        with BuildLine():
            Line((-7.33, -27.3413148916), (-7.33, -22.3057727954))
            ThreePointArc((-7.33, -22.3057727954), (-10.28, -22.5), (-13.23, -22.3057727954))
            Line((-13.23, -22.3057727954), (-13.23, -27.3413148916))
            ThreePointArc((-13.23, -27.3413148916), (-10.28, -27.5), (-7.33, -27.3413148916))
        make_face()
        with BuildLine():
            ThreePointArc((12.0257727954, 2.95), (12.1713906907, 1.4781935096), (12.22, 0))
            ThreePointArc((12.22, 0), (12.1713906907, -1.4781935096), (12.0257727954, -2.95))
            Line((12.0257727954, -2.95), (17.0613148916, -2.95))
            ThreePointArc((17.0613148916, -2.95), (17.1803000668, -1.4771324385), (17.22, 0))
            ThreePointArc((17.22, 0), (17.1803000668, 1.4771324385), (17.0613148916, 2.95))
            Line((17.0613148916, 2.95), (12.0257727954, 2.95))
        make_face()
    with SkipClean():  # cleaning this boolean's faces spoils the solid; the shape is the same uncleaned
        extrude(amount=-F7_DEPTH, mode=Mode.SUBTRACT)

    # F5 (on Top) → F8 (cut)
    with BuildSketch(Plane.XY):
        with BuildLine():
            ThreePointArc((12.0257727954, -2.95), (12.1713906907, -1.4781935096), (12.22, 0))
            ThreePointArc((12.22, 0), (12.1713906907, 1.4781935096), (12.0257727954, 2.95))
            ThreePointArc((12.0257727954, 2.95), (5.6299025767, 15.9099025767), (-7.33, 22.3057727954))
            ThreePointArc((-7.33, 22.3057727954), (-10.28, 22.5), (-13.23, 22.3057727954))
            ThreePointArc((-13.23, 22.3057727954), (-26.1899025767, 15.9099025767), (-32.5857727954, 2.95))
            ThreePointArc((-32.5857727954, 2.95), (-32.78, 0), (-32.5857727954, -2.95))
            ThreePointArc((-32.5857727954, -2.95), (-26.1899025767, -15.9099025767), (-13.23, -22.3057727954))
            ThreePointArc((-13.23, -22.3057727954), (-10.28, -22.5), (-7.33, -22.3057727954))
            ThreePointArc((-7.33, -22.3057727954), (5.6299025767, -15.9099025767), (12.0257727954, -2.95))
        make_face()
        with Locations((-10.28, 0)):
            Circle(F5_R, mode=Mode.SUBTRACT)
    extrude(amount=-F8_DEPTH, mode=Mode.SUBTRACT)

    # F9 (through all)
    with Locations(Plane.XY):
        with Locations((-40.44, 20.41), (-40.44, -20.41), (40.44, -20.41), (40.44, 20.41)):
            CounterBoreHole(F9_D / 2, F9_CBORE_D / 2, F9_CBORE_DEPTH)


solid = Compound([f2.part, f6.part])
